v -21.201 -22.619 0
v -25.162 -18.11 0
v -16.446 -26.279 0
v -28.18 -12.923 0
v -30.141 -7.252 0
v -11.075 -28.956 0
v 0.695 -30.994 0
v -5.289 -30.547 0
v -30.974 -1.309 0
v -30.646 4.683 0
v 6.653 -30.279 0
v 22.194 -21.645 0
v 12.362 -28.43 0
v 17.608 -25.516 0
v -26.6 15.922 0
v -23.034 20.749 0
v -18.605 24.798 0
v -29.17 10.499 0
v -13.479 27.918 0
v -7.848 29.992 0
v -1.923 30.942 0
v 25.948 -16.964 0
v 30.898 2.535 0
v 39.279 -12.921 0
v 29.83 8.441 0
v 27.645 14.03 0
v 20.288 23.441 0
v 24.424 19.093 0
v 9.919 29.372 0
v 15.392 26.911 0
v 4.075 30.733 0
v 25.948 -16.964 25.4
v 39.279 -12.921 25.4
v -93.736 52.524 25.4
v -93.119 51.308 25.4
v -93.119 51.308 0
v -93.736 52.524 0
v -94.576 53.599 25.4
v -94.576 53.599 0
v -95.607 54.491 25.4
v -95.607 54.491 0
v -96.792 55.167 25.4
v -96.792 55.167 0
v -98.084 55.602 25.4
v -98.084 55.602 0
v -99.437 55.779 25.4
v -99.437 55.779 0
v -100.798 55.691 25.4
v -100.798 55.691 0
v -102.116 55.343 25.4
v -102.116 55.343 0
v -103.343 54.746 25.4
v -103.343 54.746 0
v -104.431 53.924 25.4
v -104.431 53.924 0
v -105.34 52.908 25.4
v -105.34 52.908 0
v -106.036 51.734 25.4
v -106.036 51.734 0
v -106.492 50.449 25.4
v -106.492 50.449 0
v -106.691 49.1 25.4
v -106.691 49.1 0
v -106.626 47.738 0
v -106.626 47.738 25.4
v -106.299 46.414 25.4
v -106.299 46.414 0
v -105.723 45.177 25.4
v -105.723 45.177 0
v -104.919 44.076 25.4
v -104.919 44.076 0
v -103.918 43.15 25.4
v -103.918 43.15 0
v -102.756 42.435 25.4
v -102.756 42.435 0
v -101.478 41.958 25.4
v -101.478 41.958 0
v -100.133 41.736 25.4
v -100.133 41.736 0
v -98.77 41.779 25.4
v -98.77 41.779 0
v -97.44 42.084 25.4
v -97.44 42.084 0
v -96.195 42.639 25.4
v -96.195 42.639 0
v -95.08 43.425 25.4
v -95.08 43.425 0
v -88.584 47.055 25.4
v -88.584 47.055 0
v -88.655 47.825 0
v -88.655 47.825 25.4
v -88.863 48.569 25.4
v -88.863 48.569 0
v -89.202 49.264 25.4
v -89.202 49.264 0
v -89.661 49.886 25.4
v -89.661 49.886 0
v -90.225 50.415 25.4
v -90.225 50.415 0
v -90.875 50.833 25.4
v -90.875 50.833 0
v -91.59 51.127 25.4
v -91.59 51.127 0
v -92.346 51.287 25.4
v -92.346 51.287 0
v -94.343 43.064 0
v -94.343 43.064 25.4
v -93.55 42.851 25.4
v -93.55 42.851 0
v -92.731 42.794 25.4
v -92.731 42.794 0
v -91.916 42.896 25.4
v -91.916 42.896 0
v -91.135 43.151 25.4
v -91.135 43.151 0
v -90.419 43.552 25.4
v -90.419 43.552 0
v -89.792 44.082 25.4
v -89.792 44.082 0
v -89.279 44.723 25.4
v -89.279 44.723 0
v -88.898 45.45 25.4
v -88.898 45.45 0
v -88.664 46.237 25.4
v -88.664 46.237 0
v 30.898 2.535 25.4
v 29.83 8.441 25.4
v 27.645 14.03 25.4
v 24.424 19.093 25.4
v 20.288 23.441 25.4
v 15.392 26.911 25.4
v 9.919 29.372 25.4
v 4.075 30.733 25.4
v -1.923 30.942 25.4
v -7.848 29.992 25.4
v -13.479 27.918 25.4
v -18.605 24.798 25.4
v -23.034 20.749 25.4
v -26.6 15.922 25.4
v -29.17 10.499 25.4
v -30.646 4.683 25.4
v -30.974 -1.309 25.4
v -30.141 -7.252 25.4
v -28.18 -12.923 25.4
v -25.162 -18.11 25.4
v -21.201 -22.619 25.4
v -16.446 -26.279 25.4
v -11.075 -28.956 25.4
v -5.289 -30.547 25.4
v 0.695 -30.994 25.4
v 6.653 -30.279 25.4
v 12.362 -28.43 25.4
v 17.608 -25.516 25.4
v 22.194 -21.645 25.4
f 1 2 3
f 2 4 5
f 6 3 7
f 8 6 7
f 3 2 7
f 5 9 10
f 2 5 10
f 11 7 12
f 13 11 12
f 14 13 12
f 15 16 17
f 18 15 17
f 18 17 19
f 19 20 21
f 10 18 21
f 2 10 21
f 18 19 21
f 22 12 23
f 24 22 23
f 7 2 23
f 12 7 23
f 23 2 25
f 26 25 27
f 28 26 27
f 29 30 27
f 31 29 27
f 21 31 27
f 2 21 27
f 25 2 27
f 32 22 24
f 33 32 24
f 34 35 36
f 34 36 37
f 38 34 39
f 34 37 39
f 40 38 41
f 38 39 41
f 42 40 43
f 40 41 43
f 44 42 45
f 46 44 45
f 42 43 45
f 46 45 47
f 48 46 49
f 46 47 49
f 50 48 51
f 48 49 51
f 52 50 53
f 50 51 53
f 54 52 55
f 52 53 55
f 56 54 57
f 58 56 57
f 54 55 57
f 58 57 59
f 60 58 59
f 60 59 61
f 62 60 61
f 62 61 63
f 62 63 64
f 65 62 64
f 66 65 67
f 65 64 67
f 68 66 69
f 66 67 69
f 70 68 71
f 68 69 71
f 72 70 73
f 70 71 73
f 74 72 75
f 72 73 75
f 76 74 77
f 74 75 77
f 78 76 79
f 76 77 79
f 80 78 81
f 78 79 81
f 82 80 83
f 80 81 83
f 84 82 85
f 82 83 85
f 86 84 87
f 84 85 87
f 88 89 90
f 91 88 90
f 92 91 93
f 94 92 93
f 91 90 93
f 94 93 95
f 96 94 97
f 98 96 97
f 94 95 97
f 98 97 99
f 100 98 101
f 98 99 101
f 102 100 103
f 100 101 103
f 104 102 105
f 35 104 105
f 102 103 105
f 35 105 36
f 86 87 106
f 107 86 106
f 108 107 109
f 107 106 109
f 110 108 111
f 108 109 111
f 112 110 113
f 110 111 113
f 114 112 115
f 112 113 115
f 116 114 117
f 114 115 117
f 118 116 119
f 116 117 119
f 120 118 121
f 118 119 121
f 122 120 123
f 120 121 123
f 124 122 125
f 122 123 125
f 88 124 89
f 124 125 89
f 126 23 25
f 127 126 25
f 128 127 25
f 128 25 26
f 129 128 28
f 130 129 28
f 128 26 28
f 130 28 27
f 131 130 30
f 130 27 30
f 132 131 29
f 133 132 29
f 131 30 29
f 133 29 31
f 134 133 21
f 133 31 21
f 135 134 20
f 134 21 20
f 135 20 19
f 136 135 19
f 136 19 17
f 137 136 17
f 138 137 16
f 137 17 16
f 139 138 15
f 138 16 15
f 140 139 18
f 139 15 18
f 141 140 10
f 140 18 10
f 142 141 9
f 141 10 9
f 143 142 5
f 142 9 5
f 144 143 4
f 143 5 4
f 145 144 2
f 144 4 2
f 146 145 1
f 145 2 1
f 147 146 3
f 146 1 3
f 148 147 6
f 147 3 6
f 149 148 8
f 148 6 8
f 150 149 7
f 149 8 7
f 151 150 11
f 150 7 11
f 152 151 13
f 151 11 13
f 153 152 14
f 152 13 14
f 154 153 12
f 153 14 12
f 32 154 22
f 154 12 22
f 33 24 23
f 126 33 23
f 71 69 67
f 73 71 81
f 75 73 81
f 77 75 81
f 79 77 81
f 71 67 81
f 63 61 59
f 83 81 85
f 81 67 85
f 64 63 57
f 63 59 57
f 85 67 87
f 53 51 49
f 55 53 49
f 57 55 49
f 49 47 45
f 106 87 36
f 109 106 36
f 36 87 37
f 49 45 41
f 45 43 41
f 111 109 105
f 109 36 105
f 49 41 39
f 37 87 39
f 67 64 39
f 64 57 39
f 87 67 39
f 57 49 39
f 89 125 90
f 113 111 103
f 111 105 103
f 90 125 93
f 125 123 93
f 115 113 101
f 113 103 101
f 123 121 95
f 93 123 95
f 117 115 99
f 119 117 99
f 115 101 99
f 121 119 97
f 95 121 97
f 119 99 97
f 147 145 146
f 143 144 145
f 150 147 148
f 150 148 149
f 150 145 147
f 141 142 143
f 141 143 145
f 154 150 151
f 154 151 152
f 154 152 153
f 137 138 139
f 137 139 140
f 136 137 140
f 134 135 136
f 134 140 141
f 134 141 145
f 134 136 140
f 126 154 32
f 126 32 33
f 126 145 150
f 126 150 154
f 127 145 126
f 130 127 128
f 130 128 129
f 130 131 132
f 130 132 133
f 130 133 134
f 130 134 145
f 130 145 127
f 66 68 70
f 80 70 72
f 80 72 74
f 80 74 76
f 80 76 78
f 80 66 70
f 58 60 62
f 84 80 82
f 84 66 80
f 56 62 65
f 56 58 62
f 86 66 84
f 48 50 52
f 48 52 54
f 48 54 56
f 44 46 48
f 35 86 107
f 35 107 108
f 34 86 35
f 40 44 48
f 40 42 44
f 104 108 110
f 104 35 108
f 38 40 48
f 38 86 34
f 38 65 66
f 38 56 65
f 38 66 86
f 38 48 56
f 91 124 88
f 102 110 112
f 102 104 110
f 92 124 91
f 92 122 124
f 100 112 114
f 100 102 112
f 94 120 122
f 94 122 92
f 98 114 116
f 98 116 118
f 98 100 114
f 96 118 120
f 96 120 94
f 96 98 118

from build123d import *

# Parameters (mm, degrees)
F1_DEPTH = 25.4
F3_DEPTH = 25.4


with BuildPart() as f1:
    # F0 (on Top) → F1 (new body)
    with BuildSketch(Plane.XY):
        with BuildLine():
            Line((39.2790734768, -12.9209617153), (30.8977032097, 2.5353523981))
            ThreePointArc((30.8977032097, 2.5353523981), (-30.0487349208, 7.6269000962), (25.9484457544, -16.963909878))
            Line((25.9484457544, -16.963909878), (39.2790734768, -12.9209617153))
        make_face()
    extrude(amount=F1_DEPTH)


with BuildPart() as f3:
    # F2 (on Top) → F3 (new body)
    with BuildSketch(Plane.XY):
        with BuildLine():
            ThreePointArc((-95.08007756, 43.4252323122), (-93.2777942426, 45.8220338258), (-92.6382490548, 48.7518571317))
            ThreePointArc((-92.6382490548, 48.7518571317), (-92.7595412395, 50.052173519), (-93.1192327695, 51.3076242367))
            ThreePointArc((-93.1192327695, 51.3076242367), (-96.9819097184, 48.083425587), (-95.08007756, 43.4252323122))
        make_face()
        with BuildLine():
            ThreePointArc((-93.1192327695, 51.3076242367), (-92.7595412395, 50.052173519), (-92.6382490548, 48.7518571317))
            ThreePointArc((-92.6382490548, 48.7518571317), (-93.2777942426, 45.8220338258), (-95.08007756, 43.4252323122))
            ThreePointArc((-95.08007756, 43.4252323122), (-90.767443597, 43.3341955882), (-88.5844178424, 47.0546119545))
            ThreePointArc((-88.5844178424, 47.0546119545), (-89.9307953042, 50.1631751232), (-93.1192327695, 51.3076242367))
        make_face()
        with BuildLine():
            ThreePointArc((-95.08007756, 43.4252323122), (-96.9819097184, 48.083425587), (-93.1192327695, 51.3076242367))
            ThreePointArc((-93.1192327695, 51.3076242367), (-106.4916838626, 50.449102309), (-95.08007756, 43.4252323122))
        make_face()
    extrude(amount=F3_DEPTH)


solid = Compound([f1.part, f3.part])
